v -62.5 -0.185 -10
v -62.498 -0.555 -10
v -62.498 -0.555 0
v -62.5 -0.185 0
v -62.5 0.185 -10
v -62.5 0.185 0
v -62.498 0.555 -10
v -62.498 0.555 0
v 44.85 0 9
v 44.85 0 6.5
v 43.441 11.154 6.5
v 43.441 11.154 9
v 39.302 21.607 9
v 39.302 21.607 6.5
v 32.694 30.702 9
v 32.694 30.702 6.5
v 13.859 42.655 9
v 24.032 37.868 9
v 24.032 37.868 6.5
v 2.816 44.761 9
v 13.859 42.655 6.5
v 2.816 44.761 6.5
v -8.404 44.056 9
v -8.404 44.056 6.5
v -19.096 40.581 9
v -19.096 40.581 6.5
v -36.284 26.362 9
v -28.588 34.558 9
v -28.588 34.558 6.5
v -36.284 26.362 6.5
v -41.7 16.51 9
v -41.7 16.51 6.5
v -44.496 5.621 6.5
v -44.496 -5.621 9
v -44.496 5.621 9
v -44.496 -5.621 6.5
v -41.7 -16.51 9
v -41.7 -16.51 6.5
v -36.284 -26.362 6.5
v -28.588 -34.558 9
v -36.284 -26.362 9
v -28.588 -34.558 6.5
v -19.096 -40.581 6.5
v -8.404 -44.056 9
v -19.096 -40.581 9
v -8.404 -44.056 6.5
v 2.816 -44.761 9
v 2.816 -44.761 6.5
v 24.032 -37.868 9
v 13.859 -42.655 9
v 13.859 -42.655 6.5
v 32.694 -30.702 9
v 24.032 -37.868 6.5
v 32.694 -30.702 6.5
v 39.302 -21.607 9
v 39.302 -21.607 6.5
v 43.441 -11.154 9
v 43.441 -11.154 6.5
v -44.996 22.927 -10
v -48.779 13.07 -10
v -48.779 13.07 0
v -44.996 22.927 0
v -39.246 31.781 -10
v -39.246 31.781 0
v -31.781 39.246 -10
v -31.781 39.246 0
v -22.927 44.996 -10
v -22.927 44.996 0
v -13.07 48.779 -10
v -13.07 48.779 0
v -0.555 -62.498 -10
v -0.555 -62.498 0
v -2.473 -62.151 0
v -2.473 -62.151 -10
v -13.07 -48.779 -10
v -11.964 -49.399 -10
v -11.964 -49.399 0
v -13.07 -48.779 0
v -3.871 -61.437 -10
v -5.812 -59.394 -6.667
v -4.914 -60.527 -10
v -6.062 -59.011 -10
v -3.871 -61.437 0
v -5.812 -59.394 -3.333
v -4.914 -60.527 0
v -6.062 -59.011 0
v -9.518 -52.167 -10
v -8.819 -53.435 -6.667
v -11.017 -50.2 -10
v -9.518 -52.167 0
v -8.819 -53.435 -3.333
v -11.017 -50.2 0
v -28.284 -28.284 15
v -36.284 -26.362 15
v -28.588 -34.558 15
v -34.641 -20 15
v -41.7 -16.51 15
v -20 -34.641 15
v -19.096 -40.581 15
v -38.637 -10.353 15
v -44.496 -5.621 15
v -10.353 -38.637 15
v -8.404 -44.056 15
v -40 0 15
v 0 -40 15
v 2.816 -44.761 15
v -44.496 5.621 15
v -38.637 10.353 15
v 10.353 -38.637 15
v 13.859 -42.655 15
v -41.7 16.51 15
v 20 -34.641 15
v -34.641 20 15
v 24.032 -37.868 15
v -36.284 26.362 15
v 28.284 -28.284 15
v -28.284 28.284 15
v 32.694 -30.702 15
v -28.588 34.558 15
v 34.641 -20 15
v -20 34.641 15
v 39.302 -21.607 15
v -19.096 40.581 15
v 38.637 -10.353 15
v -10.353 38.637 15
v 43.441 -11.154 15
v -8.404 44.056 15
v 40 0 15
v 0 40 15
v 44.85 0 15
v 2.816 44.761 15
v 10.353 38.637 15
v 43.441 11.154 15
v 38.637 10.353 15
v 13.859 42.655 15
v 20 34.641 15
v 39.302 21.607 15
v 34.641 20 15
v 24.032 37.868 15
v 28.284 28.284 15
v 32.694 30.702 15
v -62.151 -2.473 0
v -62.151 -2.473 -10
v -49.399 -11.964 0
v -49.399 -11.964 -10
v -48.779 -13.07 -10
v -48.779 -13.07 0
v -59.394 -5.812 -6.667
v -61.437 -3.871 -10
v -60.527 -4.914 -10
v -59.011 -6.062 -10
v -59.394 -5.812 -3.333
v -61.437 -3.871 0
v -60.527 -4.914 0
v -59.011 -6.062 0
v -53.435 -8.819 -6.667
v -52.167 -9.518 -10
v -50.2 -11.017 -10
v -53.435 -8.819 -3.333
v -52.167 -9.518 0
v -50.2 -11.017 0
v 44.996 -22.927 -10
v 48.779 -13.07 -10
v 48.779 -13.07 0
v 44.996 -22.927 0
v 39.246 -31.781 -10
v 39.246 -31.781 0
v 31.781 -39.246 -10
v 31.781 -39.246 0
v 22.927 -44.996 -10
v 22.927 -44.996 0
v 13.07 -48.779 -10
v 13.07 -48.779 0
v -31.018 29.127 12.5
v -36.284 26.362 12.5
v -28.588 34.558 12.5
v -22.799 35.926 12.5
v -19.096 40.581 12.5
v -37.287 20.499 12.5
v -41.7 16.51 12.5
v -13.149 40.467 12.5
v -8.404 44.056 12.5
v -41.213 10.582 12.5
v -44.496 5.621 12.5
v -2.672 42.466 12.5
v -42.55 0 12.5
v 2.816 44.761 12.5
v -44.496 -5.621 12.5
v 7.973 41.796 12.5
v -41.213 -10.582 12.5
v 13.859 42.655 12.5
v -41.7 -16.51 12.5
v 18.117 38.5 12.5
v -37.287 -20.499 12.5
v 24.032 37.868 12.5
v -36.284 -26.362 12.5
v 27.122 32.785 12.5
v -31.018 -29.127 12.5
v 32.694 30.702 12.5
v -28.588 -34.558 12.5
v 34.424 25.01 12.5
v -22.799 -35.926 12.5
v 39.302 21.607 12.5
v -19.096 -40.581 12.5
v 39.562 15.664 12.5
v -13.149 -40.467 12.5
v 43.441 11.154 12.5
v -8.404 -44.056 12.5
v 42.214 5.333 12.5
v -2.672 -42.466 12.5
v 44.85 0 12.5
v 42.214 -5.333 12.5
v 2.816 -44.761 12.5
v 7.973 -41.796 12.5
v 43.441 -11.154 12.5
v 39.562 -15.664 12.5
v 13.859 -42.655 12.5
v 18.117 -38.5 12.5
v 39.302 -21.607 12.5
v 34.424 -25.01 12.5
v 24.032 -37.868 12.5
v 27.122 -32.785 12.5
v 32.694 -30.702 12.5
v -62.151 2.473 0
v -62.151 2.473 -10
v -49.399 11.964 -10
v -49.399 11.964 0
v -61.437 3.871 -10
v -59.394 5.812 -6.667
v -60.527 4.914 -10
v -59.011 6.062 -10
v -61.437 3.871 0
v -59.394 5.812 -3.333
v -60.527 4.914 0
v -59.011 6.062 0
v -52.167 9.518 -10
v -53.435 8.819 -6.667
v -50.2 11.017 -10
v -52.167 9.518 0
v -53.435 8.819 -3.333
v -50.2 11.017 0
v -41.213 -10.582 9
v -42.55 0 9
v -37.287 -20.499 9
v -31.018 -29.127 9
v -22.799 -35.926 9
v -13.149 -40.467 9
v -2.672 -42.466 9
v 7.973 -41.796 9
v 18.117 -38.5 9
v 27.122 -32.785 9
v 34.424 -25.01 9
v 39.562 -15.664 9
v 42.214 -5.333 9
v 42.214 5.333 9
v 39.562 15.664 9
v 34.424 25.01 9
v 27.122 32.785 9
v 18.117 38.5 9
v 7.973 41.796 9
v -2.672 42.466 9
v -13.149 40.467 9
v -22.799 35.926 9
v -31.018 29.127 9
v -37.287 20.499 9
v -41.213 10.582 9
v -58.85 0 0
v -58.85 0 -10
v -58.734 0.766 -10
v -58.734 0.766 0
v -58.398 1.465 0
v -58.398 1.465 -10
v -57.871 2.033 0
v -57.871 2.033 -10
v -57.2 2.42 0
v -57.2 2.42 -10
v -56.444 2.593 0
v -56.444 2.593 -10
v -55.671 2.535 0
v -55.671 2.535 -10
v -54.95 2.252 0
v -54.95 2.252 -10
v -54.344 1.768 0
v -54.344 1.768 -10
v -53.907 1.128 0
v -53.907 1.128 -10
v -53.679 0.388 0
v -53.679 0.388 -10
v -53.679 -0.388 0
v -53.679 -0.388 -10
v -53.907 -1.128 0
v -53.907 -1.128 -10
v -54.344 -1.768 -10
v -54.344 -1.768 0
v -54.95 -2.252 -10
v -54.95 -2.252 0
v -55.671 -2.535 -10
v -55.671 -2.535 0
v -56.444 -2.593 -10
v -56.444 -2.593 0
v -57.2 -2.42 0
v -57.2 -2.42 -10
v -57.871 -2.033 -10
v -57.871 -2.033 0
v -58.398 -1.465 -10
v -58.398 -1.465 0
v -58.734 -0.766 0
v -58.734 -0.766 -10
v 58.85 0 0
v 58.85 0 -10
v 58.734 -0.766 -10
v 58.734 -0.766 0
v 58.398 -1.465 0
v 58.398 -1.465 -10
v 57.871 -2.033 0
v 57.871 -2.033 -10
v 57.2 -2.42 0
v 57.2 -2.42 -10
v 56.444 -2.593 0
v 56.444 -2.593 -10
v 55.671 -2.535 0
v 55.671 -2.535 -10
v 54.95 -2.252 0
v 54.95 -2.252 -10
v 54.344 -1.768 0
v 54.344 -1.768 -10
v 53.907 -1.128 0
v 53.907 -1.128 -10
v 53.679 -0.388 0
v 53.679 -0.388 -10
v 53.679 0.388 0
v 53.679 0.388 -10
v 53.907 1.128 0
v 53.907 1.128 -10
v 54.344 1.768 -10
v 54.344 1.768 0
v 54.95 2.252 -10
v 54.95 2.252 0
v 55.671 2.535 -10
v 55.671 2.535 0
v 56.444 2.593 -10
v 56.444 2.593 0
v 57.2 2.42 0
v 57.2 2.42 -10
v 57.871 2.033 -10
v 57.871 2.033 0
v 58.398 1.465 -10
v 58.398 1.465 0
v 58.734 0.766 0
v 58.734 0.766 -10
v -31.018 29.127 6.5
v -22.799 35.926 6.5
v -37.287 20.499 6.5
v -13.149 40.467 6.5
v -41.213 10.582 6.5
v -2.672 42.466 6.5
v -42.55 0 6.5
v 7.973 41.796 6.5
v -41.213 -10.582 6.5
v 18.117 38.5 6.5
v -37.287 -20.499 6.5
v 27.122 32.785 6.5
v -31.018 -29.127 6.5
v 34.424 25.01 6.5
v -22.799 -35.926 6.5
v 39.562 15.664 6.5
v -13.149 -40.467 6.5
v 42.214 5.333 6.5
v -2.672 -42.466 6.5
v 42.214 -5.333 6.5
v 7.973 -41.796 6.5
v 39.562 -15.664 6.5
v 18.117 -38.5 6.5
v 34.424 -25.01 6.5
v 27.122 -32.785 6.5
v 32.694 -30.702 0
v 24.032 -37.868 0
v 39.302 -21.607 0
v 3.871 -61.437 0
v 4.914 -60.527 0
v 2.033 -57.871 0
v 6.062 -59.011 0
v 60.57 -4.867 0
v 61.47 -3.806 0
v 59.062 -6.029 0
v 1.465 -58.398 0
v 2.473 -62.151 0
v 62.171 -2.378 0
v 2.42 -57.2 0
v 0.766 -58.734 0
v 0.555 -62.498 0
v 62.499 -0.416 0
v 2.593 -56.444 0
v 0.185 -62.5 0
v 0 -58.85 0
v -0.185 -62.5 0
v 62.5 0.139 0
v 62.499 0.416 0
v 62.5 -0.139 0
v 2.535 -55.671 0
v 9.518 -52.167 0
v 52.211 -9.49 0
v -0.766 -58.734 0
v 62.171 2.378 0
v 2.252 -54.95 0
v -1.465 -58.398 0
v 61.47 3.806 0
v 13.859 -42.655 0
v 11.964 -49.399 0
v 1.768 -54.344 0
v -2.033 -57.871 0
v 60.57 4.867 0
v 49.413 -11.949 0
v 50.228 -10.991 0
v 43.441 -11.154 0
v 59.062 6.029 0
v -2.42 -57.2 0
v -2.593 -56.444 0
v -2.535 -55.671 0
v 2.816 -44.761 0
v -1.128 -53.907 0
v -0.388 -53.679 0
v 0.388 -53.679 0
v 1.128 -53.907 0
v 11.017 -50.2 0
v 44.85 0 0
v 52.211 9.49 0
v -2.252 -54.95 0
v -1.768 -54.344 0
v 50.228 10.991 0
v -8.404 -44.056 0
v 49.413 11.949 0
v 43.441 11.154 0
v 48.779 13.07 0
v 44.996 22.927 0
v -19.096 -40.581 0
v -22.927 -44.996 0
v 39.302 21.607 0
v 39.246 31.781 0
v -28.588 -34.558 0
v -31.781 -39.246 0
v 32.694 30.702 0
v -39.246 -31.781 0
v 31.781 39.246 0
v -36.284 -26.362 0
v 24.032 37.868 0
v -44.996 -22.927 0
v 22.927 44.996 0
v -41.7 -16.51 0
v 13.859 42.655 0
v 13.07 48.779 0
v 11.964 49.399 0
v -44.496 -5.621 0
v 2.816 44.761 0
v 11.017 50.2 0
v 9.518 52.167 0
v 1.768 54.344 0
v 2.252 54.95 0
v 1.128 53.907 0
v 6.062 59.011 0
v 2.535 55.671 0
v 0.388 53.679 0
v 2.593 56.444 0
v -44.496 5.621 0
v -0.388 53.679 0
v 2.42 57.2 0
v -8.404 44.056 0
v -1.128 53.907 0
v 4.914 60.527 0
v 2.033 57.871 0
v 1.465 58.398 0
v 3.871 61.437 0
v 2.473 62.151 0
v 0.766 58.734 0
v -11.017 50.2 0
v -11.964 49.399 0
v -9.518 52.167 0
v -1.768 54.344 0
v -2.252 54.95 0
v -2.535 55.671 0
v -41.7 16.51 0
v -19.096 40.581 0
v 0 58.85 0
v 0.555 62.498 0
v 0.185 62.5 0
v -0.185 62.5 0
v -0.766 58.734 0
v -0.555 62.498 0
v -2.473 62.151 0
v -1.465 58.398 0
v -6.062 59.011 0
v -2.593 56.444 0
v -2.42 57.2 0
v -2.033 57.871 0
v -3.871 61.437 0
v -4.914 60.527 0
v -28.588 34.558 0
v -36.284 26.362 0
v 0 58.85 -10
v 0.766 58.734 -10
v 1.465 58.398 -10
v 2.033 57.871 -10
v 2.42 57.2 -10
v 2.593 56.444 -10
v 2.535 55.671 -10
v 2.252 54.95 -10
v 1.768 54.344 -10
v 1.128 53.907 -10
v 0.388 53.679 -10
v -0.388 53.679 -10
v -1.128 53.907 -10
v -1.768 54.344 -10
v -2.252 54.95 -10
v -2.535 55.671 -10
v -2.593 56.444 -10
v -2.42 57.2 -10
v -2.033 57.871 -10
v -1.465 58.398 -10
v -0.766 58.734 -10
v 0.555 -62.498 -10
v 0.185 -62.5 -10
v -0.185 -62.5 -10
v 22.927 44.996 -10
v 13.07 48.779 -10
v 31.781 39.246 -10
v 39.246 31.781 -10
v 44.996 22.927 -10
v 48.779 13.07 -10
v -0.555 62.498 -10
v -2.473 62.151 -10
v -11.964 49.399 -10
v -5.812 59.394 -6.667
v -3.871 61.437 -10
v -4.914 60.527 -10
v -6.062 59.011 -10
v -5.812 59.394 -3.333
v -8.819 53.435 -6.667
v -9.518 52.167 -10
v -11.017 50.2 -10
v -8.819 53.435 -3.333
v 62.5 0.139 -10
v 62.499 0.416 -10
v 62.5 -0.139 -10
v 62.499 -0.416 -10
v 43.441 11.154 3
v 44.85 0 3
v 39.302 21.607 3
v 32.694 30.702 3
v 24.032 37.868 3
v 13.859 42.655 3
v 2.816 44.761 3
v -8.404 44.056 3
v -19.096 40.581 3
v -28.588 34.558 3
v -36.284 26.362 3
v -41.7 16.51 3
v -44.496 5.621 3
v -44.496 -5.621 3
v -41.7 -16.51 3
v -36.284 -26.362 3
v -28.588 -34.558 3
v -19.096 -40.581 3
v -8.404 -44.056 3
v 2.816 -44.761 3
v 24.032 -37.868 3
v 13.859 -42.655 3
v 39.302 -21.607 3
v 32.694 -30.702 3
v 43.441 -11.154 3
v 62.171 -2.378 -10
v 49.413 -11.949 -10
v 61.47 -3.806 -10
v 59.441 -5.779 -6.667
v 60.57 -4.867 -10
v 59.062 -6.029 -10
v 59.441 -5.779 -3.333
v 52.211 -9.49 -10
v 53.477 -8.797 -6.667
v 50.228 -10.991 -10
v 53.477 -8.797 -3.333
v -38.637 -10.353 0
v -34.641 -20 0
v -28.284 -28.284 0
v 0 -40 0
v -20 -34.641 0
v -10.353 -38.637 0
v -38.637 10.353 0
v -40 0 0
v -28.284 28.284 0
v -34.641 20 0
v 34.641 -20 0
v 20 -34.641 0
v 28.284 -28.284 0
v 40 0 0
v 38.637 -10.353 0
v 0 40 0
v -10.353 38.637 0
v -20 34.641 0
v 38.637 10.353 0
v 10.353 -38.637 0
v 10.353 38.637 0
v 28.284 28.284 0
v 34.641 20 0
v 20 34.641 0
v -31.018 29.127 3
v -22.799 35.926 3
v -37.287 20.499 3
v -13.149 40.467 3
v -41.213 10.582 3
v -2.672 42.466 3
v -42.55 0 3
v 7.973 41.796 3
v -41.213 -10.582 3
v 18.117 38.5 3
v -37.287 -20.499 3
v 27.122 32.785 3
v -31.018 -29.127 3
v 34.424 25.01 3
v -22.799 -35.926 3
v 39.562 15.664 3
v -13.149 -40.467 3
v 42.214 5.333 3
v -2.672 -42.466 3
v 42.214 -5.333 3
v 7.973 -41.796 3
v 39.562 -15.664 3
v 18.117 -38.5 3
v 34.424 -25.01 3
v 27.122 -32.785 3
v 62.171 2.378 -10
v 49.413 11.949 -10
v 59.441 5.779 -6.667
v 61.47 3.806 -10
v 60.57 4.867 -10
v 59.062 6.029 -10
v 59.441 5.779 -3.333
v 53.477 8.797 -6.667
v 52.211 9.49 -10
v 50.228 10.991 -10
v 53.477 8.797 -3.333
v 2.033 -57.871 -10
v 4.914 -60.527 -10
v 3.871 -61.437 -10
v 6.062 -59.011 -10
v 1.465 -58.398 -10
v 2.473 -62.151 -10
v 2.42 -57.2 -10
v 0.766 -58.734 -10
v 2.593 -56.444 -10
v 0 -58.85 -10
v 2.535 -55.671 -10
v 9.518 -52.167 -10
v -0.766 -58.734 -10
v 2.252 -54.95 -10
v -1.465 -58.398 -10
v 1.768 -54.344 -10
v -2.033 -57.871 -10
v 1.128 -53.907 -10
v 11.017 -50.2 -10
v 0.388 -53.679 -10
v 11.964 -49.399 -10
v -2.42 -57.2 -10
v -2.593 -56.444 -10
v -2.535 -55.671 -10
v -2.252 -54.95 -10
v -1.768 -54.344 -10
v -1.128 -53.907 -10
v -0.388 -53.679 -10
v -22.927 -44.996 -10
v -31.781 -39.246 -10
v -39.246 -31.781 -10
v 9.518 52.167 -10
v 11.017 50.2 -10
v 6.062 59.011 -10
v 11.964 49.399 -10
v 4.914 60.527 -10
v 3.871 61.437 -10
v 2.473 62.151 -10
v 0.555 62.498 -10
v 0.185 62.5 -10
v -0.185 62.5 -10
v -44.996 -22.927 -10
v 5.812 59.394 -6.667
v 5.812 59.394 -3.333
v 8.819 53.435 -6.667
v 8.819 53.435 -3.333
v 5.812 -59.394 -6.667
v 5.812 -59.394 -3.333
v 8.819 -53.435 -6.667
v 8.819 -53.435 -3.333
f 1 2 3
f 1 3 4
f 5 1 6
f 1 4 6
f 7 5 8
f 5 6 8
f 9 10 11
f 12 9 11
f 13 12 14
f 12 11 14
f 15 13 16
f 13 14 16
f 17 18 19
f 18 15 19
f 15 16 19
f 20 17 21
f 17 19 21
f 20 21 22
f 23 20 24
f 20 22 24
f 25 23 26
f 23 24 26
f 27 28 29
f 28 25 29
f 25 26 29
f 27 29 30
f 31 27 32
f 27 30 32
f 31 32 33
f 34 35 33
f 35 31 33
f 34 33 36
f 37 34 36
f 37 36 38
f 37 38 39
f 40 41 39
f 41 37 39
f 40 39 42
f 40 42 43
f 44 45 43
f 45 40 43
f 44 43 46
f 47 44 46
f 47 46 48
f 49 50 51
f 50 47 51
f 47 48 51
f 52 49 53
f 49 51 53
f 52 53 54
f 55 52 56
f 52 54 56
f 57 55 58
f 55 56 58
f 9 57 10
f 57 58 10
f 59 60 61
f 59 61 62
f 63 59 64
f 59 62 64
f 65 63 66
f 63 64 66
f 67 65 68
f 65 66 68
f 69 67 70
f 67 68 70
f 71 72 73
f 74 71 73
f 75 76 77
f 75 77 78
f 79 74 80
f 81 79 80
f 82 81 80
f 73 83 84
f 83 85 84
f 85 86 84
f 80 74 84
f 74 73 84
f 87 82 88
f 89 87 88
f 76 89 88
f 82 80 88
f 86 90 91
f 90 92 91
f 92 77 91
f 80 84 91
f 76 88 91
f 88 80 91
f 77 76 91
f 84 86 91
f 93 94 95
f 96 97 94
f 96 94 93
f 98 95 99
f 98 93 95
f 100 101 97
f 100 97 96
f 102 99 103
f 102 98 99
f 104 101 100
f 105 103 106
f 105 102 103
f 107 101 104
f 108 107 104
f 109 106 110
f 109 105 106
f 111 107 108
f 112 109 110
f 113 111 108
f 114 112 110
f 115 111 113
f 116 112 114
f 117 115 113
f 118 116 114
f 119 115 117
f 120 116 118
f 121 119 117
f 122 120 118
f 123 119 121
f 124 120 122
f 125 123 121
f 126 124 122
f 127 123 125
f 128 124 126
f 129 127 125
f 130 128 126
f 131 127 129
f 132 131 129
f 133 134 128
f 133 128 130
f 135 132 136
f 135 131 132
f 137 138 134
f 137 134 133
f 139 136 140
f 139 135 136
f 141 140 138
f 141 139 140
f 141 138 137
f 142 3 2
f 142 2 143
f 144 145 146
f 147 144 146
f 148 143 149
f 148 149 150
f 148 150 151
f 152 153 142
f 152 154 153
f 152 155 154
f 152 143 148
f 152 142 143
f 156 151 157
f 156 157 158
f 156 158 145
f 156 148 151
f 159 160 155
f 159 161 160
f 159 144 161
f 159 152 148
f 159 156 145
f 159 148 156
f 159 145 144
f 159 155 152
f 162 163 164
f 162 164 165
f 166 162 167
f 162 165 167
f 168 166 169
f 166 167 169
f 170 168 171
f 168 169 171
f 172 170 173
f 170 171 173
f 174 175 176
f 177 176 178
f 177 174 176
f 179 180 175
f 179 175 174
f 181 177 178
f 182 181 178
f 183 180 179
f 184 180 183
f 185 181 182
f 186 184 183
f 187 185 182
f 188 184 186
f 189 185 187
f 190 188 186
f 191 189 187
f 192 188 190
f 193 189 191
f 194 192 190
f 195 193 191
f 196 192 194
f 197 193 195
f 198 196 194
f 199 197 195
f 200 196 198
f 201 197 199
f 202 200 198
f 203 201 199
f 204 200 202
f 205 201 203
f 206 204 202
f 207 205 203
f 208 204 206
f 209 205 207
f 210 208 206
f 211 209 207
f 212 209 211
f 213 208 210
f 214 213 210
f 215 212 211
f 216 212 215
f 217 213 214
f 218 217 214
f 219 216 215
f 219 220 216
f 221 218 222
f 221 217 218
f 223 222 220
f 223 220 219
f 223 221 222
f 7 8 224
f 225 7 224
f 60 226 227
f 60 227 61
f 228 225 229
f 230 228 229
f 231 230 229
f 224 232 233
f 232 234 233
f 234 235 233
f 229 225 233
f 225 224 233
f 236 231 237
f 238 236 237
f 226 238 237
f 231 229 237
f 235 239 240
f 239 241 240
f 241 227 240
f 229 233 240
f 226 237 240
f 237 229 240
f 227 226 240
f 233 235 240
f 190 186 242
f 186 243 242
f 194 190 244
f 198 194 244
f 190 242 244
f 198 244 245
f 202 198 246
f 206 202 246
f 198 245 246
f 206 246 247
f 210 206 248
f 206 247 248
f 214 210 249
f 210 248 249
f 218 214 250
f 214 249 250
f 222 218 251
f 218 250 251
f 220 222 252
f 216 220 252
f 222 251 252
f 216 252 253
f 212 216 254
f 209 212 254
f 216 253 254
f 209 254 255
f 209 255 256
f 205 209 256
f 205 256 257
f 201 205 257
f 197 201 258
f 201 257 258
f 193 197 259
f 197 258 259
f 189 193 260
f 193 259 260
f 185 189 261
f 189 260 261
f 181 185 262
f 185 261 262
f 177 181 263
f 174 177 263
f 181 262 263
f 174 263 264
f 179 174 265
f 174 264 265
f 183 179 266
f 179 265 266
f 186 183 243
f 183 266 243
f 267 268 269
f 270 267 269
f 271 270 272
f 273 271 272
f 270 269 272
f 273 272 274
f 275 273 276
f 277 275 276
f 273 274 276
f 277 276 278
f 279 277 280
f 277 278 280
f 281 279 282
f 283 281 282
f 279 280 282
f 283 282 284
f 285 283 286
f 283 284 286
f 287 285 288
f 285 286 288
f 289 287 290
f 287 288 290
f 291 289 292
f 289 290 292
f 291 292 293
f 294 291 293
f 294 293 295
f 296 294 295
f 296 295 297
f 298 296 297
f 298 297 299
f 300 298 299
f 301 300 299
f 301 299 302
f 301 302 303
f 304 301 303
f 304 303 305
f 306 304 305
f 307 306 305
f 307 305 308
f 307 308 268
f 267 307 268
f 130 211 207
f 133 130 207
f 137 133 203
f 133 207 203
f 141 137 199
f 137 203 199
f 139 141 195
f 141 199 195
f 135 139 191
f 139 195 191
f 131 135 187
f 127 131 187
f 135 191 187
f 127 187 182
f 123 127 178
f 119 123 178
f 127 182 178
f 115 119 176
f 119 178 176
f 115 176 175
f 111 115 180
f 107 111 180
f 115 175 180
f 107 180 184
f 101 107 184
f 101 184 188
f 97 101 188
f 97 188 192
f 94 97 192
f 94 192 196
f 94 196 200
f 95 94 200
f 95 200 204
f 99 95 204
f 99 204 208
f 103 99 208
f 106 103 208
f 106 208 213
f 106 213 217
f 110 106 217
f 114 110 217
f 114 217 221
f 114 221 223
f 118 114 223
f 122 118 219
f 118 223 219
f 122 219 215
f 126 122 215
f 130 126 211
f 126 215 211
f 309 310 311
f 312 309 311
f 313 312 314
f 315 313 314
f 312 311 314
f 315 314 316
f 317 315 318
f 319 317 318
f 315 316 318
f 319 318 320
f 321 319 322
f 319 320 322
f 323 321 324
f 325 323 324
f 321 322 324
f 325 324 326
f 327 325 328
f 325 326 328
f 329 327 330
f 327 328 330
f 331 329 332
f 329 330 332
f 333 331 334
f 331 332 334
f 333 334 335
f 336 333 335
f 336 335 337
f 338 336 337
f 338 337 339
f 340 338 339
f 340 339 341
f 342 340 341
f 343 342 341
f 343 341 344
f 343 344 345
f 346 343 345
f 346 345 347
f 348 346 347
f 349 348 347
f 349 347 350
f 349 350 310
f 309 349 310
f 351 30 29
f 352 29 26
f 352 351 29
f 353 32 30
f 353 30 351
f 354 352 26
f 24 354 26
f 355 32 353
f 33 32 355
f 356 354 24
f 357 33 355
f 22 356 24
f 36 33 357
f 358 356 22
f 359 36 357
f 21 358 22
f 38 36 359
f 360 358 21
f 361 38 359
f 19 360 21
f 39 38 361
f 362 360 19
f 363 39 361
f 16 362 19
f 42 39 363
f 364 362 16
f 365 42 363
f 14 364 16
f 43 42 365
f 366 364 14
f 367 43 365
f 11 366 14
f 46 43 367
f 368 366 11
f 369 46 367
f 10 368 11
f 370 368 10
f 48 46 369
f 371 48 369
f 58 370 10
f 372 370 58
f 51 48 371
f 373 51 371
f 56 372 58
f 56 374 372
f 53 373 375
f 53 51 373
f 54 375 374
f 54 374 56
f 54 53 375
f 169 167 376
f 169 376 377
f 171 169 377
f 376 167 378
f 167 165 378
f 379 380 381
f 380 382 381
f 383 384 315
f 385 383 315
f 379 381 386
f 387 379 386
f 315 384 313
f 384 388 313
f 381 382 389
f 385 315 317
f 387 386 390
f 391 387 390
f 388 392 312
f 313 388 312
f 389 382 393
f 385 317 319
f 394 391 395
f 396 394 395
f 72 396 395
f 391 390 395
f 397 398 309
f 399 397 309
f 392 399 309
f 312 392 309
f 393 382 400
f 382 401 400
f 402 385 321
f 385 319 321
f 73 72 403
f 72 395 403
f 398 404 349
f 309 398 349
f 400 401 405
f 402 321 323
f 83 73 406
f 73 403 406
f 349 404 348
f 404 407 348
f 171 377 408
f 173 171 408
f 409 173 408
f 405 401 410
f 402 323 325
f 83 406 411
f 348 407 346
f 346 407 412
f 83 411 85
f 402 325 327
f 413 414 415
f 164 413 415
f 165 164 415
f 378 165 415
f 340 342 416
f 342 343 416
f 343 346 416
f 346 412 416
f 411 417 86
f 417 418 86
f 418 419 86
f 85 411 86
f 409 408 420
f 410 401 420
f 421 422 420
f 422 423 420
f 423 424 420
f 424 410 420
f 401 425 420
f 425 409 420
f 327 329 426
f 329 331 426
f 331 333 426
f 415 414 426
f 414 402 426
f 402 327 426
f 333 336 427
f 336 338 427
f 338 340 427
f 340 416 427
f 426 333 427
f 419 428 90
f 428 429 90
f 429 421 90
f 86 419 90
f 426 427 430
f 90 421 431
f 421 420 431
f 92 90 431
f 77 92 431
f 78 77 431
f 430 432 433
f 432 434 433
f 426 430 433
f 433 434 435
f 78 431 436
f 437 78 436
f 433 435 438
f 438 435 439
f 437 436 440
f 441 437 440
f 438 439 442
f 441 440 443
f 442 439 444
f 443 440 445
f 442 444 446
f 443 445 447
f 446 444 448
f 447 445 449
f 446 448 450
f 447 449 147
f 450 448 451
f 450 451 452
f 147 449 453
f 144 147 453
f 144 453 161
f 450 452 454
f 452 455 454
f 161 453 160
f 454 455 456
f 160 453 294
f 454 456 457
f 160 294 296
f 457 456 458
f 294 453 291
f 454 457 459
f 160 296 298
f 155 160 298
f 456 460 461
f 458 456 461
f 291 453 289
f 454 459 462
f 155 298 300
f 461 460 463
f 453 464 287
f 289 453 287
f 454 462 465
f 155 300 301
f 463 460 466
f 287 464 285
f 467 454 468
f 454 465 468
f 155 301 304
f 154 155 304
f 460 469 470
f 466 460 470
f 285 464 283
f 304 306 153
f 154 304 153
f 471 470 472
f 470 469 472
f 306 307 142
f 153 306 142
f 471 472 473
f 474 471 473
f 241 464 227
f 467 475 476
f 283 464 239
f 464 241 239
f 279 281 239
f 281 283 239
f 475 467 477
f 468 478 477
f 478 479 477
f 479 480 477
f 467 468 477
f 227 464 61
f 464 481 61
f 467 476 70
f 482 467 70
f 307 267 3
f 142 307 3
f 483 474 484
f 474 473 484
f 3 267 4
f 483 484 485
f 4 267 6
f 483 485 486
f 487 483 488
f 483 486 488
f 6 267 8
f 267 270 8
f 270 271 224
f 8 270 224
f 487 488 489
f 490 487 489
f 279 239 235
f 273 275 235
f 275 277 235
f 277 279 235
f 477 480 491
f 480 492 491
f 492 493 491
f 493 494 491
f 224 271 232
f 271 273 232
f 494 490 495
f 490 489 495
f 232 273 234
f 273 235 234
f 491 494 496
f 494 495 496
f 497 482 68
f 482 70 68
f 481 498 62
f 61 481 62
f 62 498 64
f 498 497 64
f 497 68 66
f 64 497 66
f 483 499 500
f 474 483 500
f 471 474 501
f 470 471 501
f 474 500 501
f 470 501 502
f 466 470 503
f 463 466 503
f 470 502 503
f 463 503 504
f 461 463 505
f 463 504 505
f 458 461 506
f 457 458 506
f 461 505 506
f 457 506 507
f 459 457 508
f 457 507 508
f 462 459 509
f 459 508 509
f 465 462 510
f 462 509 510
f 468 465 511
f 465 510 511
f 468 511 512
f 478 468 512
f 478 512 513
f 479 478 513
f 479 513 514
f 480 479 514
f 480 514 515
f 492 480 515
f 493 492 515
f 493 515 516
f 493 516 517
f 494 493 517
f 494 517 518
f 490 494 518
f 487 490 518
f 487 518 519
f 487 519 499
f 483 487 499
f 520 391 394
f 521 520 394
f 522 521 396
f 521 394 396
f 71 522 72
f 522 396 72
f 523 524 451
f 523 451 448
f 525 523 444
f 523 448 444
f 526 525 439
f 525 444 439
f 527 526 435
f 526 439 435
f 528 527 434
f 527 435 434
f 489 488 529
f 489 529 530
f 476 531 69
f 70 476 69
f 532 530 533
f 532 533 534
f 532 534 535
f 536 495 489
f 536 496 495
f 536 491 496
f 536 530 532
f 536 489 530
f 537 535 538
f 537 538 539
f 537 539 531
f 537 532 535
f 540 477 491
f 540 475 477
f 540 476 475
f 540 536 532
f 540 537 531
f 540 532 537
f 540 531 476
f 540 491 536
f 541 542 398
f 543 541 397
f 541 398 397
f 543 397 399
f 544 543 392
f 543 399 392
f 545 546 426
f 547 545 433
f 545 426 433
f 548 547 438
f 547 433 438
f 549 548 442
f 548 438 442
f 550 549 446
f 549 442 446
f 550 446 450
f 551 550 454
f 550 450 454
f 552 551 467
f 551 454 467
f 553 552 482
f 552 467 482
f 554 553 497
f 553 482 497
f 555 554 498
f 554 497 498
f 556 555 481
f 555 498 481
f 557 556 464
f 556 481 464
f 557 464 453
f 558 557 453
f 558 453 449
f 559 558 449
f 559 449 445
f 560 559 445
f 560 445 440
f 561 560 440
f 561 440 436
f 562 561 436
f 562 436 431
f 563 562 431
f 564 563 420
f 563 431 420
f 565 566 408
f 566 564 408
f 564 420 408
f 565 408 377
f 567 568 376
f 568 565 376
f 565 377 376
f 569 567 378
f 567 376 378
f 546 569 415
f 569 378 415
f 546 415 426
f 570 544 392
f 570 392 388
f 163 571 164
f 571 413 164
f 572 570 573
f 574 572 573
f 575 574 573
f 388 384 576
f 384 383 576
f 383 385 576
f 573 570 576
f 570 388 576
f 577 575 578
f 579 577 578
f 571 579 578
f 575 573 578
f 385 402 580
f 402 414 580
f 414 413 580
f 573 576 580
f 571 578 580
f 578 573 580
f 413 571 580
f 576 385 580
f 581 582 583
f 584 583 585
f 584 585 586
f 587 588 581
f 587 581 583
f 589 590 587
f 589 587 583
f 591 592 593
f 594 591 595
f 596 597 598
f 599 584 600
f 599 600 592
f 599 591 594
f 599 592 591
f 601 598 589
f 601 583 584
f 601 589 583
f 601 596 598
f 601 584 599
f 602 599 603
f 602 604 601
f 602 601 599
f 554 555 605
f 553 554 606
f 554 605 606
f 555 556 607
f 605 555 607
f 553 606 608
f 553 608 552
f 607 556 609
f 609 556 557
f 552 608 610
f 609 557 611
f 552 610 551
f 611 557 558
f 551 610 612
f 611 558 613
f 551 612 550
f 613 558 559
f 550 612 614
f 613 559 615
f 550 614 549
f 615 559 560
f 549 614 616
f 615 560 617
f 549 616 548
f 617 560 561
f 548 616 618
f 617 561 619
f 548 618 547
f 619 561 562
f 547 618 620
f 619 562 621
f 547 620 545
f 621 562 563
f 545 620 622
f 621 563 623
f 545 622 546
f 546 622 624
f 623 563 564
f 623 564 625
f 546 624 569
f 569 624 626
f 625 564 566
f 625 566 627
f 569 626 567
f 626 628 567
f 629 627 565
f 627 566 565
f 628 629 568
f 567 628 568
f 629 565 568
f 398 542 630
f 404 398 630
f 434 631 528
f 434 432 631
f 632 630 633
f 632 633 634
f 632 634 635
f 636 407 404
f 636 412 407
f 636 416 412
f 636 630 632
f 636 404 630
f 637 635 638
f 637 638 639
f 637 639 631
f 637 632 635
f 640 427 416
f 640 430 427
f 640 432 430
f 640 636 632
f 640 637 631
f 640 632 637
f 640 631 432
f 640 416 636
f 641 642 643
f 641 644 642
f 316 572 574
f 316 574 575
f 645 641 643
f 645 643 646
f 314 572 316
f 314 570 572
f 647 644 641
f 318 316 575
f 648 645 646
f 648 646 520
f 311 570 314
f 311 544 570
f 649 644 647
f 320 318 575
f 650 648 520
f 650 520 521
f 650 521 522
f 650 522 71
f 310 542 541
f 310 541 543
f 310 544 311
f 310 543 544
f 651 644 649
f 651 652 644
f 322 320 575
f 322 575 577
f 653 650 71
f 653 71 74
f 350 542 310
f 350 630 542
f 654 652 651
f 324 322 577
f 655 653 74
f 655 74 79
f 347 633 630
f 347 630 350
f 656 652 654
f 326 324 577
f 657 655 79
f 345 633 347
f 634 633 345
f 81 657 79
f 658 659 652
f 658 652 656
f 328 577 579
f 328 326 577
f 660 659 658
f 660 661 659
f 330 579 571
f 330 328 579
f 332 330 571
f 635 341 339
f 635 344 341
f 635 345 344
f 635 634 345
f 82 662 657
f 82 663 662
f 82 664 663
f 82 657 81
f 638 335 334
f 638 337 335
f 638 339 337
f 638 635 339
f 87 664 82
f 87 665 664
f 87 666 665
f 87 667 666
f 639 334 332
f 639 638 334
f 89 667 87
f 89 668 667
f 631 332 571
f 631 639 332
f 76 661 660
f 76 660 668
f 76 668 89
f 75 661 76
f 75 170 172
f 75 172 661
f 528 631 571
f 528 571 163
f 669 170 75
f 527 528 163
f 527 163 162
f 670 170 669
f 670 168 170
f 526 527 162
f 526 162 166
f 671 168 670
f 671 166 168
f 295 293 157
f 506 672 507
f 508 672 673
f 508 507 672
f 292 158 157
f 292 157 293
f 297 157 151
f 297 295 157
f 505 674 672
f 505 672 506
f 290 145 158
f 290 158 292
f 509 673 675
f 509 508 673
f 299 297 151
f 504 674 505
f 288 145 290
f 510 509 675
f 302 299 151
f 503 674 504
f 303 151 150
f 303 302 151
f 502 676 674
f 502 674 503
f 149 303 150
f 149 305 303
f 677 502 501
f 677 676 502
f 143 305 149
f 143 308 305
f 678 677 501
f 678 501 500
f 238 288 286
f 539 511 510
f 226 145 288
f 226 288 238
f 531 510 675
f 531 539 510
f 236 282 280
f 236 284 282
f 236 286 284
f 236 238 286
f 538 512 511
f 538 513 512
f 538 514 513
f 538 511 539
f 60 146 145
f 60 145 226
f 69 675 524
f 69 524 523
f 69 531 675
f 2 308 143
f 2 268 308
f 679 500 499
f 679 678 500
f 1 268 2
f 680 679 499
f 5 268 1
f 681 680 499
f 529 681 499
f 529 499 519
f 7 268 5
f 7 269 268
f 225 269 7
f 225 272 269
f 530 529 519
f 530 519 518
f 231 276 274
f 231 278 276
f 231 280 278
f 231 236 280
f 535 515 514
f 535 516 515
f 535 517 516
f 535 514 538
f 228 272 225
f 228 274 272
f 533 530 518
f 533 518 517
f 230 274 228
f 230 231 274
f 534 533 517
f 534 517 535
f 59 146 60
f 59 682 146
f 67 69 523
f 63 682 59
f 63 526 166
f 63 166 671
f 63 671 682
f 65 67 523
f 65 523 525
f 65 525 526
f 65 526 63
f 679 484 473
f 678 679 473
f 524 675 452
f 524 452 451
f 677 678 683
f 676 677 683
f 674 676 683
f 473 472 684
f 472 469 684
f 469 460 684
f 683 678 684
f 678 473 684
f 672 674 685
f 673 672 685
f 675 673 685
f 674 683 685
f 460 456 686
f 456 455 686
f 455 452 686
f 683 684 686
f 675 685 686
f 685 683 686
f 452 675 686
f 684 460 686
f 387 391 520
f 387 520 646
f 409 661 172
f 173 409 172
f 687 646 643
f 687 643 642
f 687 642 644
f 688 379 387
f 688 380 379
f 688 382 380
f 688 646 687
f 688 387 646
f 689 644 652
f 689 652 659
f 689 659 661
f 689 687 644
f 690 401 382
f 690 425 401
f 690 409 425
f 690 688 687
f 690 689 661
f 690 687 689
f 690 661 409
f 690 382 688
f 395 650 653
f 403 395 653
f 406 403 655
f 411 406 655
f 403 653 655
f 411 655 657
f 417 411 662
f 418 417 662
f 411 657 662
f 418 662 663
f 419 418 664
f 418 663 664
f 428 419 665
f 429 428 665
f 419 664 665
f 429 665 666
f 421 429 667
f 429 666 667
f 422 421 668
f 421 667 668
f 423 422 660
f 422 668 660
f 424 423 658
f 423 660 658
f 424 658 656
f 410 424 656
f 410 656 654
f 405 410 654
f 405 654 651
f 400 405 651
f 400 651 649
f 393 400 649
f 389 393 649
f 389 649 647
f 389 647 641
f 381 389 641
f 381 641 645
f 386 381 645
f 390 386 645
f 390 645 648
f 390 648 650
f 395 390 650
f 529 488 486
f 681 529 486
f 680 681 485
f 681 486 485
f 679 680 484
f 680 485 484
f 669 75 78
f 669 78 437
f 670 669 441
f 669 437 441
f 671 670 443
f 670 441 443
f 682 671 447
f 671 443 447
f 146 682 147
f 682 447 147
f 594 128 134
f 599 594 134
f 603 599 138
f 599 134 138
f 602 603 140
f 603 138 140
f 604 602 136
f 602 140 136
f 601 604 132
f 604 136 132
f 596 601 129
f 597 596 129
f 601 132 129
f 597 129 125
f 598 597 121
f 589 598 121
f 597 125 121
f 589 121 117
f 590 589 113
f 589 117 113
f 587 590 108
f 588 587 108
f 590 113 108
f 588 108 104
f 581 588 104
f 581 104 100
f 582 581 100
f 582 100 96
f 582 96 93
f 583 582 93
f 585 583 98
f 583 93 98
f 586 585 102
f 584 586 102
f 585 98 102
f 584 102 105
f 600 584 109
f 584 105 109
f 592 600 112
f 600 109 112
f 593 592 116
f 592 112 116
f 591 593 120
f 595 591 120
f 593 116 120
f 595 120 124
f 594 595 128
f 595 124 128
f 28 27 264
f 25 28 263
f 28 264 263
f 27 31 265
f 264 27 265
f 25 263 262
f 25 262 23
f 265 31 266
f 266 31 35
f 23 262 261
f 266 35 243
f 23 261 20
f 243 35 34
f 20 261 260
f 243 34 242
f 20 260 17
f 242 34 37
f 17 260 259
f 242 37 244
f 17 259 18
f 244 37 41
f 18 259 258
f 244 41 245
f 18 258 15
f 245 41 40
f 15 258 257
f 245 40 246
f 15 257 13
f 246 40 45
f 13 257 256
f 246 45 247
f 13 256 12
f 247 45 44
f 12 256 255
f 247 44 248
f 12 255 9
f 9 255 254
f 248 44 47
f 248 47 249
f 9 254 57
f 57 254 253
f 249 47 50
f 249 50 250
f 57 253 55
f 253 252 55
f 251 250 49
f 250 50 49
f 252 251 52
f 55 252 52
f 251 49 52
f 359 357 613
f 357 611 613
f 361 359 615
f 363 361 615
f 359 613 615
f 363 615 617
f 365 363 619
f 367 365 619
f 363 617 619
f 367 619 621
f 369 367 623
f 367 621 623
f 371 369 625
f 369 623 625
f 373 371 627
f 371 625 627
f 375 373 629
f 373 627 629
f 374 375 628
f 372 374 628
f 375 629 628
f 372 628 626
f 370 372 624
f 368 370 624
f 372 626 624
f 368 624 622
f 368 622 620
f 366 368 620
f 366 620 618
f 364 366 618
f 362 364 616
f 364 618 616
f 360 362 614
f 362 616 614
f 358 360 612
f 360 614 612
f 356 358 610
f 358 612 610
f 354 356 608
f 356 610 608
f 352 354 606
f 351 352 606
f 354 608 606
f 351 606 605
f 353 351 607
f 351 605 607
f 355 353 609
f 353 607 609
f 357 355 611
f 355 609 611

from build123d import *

# Parameters (mm, degrees)
SKETCH1_R           = 44.85
BOSS_EXTRUDE1_DEPTH = 15
SKETCH2_R           = 62.5
BOSS_EXTRUDE2_DEPTH = 10
SKETCH3_R           = 40
CUT_EXTRUDE1_DEPTH  = 15
SKETCH4_W           = 3.5
SKETCH4_H           = 3.5
SKETCH7_R           = 2.6
CUT_EXTRUDE4_DEPTH  = 92.855865354
CIRPATTERN1_COUNT   = 4
CUT_EXTRUDE6_DEPTH  = 10


with BuildPart() as part:
    # Sketch1 → Boss-Extrude1 (new body)
    with BuildSketch(Plane.XY):
        Circle(SKETCH1_R)
    extrude(amount=BOSS_EXTRUDE1_DEPTH)

    # Sketch2 → Boss-Extrude2 (add)
    with BuildSketch(Plane(origin=(0, 0, 0), x_dir=(-1, 0, 0), z_dir=(0, 0, -1))):
        Circle(SKETCH2_R)
    extrude(amount=BOSS_EXTRUDE2_DEPTH)

    # Sketch3 → Cut-Extrude1 (cut)
    with BuildSketch(Plane.XY.offset(15)):
        Circle(SKETCH3_R)
    extrude(amount=-CUT_EXTRUDE1_DEPTH, mode=Mode.SUBTRACT)

    # Sketch4 → Cut-Revolve1 (revolve, cut)
    with BuildSketch(Plane(origin=(0, 0, 0), x_dir=(0, 0, -1), z_dir=(1, 0, 0))):
        with Locations((-10.75, 44.3)):
            Rectangle(SKETCH4_W, SKETCH4_H)
        with Locations((-4.75, 44.3)):
            Rectangle(SKETCH4_W, SKETCH4_H)
    revolve(axis=Axis((0, 0, -42.713110189), (0, 0, 1)), mode=Mode.SUBTRACT)

    # Sketch7 → Cut-Extrude4 (cut, through all)
    with BuildSketch(Plane(origin=(0, 0, -10), x_dir=(-1, 0, 0), z_dir=(0, 0, -1))):
        with Locations((56.25, 0)):
            Circle(SKETCH7_R)
    cut_extrude4 = extrude(amount=-CUT_EXTRUDE4_DEPTH, mode=Mode.SUBTRACT)

    # CirPattern1: Cut-Extrude4 ×4 about axis
    cirpattern1_axis = Axis((0, 0, -45.874761596), (0, 0, 1))
    for i in range(1, CIRPATTERN1_COUNT):
        add(cut_extrude4.rotate(cirpattern1_axis, i * 360 / CIRPATTERN1_COUNT), mode=Mode.SUBTRACT)

    # Sketch9 → Cut-Extrude6 (cut)
    with BuildSketch(Plane.XY):
        with BuildLine():
            ThreePointArc((13.070361778, 48.779254228), (35.70889245, 35.70889245), (48.779254228, 13.070361778))
            add(Edge.make_bspline(
                [(62.498616294, 0.415886171), (62.283969661, 8.150798689), (51.453042115, 6.968928103), (48.779254228, 13.070361778)],
                knots=[0.017259954, 0.017259954, 0.017259954, 0.017259954, 1, 1, 1, 1], degree=3))
            ThreePointArc((62.498616294, 0.415886171), (44.24319492, 44.145098293), (0.55461157, 62.4975392))
            add(Edge.make_bspline(
                [(0.55461157, 62.4975392), (8.100511472, 62.208727423), (7.033582927, 51.397803822), (13.070361778, 48.779254228)],
                knots=[0.023286113, 0.023286113, 0.023286113, 0.023286113, 1, 1, 1, 1], degree=3))
        make_face()
        with BuildLine():
            add(Edge.make_bspline(
                [(62.498616294, -0.415886171), (62.283969661, -8.150798689), (51.453042115, -6.968928103), (48.779254228, -13.070361778)],
                knots=[0.017259954, 0.017259954, 0.017259954, 0.017259954, 1, 1, 1, 1], degree=3))
            ThreePointArc((48.779254228, -13.070361778), (35.70889245, -35.70889245), (13.070361778, -48.779254228))
            add(Edge.make_bspline(
                [(0.55461157, -62.4975392), (8.100511472, -62.208727423), (7.033582927, -51.397803822), (13.070361778, -48.779254228)],
                knots=[0.023286113, 0.023286113, 0.023286113, 0.023286113, 1, 1, 1, 1], degree=3))
            ThreePointArc((0.55461157, -62.4975392), (44.24319492, -44.145098293), (62.498616294, -0.415886171))
        make_face()
        with BuildLine():
            ThreePointArc((-48.779254228, 13.070361778), (-35.70889245, 35.70889245), (-13.070361778, 48.779254228))
            add(Edge.make_bspline(
                [(-0.55461157, 62.4975392), (-8.100511472, 62.208727423), (-7.033582927, 51.397803822), (-13.070361778, 48.779254228)],
                knots=[0.023286113, 0.023286113, 0.023286113, 0.023286113, 1, 1, 1, 1], degree=3))
            ThreePointArc((-0.55461157, 62.4975392), (-44.194173824, 44.194173824), (-62.4975392, 0.55461157))
            add(Edge.make_bspline(
                [(-62.4975392, 0.55461157), (-62.208727423, 8.100511472), (-51.397803822, 7.033582927), (-48.779254228, 13.070361778)],
                knots=[0.023286113, 0.023286113, 0.023286113, 0.023286113, 1, 1, 1, 1], degree=3))
        make_face()
        with BuildLine():
            add(Edge.make_bspline(
                [(-0.55461157, -62.4975392), (-8.100511472, -62.208727423), (-7.033582927, -51.397803822), (-13.070361778, -48.779254228)],
                knots=[0.023286113, 0.023286113, 0.023286113, 0.023286113, 1, 1, 1, 1], degree=3))
            ThreePointArc((-13.070361778, -48.779254228), (-35.70889245, -35.70889245), (-48.779254228, -13.070361778))
            add(Edge.make_bspline(
                [(-62.4975392, -0.55461157), (-62.208727423, -8.100511472), (-51.397803822, -7.033582927), (-48.779254228, -13.070361778)],
                knots=[0.023286113, 0.023286113, 0.023286113, 0.023286113, 1, 1, 1, 1], degree=3))
            ThreePointArc((-62.4975392, -0.55461157), (-44.194173824, -44.194173824), (-0.55461157, -62.4975392))
        make_face()
    extrude(amount=-CUT_EXTRUDE6_DEPTH, mode=Mode.SUBTRACT)


solid = part.part
